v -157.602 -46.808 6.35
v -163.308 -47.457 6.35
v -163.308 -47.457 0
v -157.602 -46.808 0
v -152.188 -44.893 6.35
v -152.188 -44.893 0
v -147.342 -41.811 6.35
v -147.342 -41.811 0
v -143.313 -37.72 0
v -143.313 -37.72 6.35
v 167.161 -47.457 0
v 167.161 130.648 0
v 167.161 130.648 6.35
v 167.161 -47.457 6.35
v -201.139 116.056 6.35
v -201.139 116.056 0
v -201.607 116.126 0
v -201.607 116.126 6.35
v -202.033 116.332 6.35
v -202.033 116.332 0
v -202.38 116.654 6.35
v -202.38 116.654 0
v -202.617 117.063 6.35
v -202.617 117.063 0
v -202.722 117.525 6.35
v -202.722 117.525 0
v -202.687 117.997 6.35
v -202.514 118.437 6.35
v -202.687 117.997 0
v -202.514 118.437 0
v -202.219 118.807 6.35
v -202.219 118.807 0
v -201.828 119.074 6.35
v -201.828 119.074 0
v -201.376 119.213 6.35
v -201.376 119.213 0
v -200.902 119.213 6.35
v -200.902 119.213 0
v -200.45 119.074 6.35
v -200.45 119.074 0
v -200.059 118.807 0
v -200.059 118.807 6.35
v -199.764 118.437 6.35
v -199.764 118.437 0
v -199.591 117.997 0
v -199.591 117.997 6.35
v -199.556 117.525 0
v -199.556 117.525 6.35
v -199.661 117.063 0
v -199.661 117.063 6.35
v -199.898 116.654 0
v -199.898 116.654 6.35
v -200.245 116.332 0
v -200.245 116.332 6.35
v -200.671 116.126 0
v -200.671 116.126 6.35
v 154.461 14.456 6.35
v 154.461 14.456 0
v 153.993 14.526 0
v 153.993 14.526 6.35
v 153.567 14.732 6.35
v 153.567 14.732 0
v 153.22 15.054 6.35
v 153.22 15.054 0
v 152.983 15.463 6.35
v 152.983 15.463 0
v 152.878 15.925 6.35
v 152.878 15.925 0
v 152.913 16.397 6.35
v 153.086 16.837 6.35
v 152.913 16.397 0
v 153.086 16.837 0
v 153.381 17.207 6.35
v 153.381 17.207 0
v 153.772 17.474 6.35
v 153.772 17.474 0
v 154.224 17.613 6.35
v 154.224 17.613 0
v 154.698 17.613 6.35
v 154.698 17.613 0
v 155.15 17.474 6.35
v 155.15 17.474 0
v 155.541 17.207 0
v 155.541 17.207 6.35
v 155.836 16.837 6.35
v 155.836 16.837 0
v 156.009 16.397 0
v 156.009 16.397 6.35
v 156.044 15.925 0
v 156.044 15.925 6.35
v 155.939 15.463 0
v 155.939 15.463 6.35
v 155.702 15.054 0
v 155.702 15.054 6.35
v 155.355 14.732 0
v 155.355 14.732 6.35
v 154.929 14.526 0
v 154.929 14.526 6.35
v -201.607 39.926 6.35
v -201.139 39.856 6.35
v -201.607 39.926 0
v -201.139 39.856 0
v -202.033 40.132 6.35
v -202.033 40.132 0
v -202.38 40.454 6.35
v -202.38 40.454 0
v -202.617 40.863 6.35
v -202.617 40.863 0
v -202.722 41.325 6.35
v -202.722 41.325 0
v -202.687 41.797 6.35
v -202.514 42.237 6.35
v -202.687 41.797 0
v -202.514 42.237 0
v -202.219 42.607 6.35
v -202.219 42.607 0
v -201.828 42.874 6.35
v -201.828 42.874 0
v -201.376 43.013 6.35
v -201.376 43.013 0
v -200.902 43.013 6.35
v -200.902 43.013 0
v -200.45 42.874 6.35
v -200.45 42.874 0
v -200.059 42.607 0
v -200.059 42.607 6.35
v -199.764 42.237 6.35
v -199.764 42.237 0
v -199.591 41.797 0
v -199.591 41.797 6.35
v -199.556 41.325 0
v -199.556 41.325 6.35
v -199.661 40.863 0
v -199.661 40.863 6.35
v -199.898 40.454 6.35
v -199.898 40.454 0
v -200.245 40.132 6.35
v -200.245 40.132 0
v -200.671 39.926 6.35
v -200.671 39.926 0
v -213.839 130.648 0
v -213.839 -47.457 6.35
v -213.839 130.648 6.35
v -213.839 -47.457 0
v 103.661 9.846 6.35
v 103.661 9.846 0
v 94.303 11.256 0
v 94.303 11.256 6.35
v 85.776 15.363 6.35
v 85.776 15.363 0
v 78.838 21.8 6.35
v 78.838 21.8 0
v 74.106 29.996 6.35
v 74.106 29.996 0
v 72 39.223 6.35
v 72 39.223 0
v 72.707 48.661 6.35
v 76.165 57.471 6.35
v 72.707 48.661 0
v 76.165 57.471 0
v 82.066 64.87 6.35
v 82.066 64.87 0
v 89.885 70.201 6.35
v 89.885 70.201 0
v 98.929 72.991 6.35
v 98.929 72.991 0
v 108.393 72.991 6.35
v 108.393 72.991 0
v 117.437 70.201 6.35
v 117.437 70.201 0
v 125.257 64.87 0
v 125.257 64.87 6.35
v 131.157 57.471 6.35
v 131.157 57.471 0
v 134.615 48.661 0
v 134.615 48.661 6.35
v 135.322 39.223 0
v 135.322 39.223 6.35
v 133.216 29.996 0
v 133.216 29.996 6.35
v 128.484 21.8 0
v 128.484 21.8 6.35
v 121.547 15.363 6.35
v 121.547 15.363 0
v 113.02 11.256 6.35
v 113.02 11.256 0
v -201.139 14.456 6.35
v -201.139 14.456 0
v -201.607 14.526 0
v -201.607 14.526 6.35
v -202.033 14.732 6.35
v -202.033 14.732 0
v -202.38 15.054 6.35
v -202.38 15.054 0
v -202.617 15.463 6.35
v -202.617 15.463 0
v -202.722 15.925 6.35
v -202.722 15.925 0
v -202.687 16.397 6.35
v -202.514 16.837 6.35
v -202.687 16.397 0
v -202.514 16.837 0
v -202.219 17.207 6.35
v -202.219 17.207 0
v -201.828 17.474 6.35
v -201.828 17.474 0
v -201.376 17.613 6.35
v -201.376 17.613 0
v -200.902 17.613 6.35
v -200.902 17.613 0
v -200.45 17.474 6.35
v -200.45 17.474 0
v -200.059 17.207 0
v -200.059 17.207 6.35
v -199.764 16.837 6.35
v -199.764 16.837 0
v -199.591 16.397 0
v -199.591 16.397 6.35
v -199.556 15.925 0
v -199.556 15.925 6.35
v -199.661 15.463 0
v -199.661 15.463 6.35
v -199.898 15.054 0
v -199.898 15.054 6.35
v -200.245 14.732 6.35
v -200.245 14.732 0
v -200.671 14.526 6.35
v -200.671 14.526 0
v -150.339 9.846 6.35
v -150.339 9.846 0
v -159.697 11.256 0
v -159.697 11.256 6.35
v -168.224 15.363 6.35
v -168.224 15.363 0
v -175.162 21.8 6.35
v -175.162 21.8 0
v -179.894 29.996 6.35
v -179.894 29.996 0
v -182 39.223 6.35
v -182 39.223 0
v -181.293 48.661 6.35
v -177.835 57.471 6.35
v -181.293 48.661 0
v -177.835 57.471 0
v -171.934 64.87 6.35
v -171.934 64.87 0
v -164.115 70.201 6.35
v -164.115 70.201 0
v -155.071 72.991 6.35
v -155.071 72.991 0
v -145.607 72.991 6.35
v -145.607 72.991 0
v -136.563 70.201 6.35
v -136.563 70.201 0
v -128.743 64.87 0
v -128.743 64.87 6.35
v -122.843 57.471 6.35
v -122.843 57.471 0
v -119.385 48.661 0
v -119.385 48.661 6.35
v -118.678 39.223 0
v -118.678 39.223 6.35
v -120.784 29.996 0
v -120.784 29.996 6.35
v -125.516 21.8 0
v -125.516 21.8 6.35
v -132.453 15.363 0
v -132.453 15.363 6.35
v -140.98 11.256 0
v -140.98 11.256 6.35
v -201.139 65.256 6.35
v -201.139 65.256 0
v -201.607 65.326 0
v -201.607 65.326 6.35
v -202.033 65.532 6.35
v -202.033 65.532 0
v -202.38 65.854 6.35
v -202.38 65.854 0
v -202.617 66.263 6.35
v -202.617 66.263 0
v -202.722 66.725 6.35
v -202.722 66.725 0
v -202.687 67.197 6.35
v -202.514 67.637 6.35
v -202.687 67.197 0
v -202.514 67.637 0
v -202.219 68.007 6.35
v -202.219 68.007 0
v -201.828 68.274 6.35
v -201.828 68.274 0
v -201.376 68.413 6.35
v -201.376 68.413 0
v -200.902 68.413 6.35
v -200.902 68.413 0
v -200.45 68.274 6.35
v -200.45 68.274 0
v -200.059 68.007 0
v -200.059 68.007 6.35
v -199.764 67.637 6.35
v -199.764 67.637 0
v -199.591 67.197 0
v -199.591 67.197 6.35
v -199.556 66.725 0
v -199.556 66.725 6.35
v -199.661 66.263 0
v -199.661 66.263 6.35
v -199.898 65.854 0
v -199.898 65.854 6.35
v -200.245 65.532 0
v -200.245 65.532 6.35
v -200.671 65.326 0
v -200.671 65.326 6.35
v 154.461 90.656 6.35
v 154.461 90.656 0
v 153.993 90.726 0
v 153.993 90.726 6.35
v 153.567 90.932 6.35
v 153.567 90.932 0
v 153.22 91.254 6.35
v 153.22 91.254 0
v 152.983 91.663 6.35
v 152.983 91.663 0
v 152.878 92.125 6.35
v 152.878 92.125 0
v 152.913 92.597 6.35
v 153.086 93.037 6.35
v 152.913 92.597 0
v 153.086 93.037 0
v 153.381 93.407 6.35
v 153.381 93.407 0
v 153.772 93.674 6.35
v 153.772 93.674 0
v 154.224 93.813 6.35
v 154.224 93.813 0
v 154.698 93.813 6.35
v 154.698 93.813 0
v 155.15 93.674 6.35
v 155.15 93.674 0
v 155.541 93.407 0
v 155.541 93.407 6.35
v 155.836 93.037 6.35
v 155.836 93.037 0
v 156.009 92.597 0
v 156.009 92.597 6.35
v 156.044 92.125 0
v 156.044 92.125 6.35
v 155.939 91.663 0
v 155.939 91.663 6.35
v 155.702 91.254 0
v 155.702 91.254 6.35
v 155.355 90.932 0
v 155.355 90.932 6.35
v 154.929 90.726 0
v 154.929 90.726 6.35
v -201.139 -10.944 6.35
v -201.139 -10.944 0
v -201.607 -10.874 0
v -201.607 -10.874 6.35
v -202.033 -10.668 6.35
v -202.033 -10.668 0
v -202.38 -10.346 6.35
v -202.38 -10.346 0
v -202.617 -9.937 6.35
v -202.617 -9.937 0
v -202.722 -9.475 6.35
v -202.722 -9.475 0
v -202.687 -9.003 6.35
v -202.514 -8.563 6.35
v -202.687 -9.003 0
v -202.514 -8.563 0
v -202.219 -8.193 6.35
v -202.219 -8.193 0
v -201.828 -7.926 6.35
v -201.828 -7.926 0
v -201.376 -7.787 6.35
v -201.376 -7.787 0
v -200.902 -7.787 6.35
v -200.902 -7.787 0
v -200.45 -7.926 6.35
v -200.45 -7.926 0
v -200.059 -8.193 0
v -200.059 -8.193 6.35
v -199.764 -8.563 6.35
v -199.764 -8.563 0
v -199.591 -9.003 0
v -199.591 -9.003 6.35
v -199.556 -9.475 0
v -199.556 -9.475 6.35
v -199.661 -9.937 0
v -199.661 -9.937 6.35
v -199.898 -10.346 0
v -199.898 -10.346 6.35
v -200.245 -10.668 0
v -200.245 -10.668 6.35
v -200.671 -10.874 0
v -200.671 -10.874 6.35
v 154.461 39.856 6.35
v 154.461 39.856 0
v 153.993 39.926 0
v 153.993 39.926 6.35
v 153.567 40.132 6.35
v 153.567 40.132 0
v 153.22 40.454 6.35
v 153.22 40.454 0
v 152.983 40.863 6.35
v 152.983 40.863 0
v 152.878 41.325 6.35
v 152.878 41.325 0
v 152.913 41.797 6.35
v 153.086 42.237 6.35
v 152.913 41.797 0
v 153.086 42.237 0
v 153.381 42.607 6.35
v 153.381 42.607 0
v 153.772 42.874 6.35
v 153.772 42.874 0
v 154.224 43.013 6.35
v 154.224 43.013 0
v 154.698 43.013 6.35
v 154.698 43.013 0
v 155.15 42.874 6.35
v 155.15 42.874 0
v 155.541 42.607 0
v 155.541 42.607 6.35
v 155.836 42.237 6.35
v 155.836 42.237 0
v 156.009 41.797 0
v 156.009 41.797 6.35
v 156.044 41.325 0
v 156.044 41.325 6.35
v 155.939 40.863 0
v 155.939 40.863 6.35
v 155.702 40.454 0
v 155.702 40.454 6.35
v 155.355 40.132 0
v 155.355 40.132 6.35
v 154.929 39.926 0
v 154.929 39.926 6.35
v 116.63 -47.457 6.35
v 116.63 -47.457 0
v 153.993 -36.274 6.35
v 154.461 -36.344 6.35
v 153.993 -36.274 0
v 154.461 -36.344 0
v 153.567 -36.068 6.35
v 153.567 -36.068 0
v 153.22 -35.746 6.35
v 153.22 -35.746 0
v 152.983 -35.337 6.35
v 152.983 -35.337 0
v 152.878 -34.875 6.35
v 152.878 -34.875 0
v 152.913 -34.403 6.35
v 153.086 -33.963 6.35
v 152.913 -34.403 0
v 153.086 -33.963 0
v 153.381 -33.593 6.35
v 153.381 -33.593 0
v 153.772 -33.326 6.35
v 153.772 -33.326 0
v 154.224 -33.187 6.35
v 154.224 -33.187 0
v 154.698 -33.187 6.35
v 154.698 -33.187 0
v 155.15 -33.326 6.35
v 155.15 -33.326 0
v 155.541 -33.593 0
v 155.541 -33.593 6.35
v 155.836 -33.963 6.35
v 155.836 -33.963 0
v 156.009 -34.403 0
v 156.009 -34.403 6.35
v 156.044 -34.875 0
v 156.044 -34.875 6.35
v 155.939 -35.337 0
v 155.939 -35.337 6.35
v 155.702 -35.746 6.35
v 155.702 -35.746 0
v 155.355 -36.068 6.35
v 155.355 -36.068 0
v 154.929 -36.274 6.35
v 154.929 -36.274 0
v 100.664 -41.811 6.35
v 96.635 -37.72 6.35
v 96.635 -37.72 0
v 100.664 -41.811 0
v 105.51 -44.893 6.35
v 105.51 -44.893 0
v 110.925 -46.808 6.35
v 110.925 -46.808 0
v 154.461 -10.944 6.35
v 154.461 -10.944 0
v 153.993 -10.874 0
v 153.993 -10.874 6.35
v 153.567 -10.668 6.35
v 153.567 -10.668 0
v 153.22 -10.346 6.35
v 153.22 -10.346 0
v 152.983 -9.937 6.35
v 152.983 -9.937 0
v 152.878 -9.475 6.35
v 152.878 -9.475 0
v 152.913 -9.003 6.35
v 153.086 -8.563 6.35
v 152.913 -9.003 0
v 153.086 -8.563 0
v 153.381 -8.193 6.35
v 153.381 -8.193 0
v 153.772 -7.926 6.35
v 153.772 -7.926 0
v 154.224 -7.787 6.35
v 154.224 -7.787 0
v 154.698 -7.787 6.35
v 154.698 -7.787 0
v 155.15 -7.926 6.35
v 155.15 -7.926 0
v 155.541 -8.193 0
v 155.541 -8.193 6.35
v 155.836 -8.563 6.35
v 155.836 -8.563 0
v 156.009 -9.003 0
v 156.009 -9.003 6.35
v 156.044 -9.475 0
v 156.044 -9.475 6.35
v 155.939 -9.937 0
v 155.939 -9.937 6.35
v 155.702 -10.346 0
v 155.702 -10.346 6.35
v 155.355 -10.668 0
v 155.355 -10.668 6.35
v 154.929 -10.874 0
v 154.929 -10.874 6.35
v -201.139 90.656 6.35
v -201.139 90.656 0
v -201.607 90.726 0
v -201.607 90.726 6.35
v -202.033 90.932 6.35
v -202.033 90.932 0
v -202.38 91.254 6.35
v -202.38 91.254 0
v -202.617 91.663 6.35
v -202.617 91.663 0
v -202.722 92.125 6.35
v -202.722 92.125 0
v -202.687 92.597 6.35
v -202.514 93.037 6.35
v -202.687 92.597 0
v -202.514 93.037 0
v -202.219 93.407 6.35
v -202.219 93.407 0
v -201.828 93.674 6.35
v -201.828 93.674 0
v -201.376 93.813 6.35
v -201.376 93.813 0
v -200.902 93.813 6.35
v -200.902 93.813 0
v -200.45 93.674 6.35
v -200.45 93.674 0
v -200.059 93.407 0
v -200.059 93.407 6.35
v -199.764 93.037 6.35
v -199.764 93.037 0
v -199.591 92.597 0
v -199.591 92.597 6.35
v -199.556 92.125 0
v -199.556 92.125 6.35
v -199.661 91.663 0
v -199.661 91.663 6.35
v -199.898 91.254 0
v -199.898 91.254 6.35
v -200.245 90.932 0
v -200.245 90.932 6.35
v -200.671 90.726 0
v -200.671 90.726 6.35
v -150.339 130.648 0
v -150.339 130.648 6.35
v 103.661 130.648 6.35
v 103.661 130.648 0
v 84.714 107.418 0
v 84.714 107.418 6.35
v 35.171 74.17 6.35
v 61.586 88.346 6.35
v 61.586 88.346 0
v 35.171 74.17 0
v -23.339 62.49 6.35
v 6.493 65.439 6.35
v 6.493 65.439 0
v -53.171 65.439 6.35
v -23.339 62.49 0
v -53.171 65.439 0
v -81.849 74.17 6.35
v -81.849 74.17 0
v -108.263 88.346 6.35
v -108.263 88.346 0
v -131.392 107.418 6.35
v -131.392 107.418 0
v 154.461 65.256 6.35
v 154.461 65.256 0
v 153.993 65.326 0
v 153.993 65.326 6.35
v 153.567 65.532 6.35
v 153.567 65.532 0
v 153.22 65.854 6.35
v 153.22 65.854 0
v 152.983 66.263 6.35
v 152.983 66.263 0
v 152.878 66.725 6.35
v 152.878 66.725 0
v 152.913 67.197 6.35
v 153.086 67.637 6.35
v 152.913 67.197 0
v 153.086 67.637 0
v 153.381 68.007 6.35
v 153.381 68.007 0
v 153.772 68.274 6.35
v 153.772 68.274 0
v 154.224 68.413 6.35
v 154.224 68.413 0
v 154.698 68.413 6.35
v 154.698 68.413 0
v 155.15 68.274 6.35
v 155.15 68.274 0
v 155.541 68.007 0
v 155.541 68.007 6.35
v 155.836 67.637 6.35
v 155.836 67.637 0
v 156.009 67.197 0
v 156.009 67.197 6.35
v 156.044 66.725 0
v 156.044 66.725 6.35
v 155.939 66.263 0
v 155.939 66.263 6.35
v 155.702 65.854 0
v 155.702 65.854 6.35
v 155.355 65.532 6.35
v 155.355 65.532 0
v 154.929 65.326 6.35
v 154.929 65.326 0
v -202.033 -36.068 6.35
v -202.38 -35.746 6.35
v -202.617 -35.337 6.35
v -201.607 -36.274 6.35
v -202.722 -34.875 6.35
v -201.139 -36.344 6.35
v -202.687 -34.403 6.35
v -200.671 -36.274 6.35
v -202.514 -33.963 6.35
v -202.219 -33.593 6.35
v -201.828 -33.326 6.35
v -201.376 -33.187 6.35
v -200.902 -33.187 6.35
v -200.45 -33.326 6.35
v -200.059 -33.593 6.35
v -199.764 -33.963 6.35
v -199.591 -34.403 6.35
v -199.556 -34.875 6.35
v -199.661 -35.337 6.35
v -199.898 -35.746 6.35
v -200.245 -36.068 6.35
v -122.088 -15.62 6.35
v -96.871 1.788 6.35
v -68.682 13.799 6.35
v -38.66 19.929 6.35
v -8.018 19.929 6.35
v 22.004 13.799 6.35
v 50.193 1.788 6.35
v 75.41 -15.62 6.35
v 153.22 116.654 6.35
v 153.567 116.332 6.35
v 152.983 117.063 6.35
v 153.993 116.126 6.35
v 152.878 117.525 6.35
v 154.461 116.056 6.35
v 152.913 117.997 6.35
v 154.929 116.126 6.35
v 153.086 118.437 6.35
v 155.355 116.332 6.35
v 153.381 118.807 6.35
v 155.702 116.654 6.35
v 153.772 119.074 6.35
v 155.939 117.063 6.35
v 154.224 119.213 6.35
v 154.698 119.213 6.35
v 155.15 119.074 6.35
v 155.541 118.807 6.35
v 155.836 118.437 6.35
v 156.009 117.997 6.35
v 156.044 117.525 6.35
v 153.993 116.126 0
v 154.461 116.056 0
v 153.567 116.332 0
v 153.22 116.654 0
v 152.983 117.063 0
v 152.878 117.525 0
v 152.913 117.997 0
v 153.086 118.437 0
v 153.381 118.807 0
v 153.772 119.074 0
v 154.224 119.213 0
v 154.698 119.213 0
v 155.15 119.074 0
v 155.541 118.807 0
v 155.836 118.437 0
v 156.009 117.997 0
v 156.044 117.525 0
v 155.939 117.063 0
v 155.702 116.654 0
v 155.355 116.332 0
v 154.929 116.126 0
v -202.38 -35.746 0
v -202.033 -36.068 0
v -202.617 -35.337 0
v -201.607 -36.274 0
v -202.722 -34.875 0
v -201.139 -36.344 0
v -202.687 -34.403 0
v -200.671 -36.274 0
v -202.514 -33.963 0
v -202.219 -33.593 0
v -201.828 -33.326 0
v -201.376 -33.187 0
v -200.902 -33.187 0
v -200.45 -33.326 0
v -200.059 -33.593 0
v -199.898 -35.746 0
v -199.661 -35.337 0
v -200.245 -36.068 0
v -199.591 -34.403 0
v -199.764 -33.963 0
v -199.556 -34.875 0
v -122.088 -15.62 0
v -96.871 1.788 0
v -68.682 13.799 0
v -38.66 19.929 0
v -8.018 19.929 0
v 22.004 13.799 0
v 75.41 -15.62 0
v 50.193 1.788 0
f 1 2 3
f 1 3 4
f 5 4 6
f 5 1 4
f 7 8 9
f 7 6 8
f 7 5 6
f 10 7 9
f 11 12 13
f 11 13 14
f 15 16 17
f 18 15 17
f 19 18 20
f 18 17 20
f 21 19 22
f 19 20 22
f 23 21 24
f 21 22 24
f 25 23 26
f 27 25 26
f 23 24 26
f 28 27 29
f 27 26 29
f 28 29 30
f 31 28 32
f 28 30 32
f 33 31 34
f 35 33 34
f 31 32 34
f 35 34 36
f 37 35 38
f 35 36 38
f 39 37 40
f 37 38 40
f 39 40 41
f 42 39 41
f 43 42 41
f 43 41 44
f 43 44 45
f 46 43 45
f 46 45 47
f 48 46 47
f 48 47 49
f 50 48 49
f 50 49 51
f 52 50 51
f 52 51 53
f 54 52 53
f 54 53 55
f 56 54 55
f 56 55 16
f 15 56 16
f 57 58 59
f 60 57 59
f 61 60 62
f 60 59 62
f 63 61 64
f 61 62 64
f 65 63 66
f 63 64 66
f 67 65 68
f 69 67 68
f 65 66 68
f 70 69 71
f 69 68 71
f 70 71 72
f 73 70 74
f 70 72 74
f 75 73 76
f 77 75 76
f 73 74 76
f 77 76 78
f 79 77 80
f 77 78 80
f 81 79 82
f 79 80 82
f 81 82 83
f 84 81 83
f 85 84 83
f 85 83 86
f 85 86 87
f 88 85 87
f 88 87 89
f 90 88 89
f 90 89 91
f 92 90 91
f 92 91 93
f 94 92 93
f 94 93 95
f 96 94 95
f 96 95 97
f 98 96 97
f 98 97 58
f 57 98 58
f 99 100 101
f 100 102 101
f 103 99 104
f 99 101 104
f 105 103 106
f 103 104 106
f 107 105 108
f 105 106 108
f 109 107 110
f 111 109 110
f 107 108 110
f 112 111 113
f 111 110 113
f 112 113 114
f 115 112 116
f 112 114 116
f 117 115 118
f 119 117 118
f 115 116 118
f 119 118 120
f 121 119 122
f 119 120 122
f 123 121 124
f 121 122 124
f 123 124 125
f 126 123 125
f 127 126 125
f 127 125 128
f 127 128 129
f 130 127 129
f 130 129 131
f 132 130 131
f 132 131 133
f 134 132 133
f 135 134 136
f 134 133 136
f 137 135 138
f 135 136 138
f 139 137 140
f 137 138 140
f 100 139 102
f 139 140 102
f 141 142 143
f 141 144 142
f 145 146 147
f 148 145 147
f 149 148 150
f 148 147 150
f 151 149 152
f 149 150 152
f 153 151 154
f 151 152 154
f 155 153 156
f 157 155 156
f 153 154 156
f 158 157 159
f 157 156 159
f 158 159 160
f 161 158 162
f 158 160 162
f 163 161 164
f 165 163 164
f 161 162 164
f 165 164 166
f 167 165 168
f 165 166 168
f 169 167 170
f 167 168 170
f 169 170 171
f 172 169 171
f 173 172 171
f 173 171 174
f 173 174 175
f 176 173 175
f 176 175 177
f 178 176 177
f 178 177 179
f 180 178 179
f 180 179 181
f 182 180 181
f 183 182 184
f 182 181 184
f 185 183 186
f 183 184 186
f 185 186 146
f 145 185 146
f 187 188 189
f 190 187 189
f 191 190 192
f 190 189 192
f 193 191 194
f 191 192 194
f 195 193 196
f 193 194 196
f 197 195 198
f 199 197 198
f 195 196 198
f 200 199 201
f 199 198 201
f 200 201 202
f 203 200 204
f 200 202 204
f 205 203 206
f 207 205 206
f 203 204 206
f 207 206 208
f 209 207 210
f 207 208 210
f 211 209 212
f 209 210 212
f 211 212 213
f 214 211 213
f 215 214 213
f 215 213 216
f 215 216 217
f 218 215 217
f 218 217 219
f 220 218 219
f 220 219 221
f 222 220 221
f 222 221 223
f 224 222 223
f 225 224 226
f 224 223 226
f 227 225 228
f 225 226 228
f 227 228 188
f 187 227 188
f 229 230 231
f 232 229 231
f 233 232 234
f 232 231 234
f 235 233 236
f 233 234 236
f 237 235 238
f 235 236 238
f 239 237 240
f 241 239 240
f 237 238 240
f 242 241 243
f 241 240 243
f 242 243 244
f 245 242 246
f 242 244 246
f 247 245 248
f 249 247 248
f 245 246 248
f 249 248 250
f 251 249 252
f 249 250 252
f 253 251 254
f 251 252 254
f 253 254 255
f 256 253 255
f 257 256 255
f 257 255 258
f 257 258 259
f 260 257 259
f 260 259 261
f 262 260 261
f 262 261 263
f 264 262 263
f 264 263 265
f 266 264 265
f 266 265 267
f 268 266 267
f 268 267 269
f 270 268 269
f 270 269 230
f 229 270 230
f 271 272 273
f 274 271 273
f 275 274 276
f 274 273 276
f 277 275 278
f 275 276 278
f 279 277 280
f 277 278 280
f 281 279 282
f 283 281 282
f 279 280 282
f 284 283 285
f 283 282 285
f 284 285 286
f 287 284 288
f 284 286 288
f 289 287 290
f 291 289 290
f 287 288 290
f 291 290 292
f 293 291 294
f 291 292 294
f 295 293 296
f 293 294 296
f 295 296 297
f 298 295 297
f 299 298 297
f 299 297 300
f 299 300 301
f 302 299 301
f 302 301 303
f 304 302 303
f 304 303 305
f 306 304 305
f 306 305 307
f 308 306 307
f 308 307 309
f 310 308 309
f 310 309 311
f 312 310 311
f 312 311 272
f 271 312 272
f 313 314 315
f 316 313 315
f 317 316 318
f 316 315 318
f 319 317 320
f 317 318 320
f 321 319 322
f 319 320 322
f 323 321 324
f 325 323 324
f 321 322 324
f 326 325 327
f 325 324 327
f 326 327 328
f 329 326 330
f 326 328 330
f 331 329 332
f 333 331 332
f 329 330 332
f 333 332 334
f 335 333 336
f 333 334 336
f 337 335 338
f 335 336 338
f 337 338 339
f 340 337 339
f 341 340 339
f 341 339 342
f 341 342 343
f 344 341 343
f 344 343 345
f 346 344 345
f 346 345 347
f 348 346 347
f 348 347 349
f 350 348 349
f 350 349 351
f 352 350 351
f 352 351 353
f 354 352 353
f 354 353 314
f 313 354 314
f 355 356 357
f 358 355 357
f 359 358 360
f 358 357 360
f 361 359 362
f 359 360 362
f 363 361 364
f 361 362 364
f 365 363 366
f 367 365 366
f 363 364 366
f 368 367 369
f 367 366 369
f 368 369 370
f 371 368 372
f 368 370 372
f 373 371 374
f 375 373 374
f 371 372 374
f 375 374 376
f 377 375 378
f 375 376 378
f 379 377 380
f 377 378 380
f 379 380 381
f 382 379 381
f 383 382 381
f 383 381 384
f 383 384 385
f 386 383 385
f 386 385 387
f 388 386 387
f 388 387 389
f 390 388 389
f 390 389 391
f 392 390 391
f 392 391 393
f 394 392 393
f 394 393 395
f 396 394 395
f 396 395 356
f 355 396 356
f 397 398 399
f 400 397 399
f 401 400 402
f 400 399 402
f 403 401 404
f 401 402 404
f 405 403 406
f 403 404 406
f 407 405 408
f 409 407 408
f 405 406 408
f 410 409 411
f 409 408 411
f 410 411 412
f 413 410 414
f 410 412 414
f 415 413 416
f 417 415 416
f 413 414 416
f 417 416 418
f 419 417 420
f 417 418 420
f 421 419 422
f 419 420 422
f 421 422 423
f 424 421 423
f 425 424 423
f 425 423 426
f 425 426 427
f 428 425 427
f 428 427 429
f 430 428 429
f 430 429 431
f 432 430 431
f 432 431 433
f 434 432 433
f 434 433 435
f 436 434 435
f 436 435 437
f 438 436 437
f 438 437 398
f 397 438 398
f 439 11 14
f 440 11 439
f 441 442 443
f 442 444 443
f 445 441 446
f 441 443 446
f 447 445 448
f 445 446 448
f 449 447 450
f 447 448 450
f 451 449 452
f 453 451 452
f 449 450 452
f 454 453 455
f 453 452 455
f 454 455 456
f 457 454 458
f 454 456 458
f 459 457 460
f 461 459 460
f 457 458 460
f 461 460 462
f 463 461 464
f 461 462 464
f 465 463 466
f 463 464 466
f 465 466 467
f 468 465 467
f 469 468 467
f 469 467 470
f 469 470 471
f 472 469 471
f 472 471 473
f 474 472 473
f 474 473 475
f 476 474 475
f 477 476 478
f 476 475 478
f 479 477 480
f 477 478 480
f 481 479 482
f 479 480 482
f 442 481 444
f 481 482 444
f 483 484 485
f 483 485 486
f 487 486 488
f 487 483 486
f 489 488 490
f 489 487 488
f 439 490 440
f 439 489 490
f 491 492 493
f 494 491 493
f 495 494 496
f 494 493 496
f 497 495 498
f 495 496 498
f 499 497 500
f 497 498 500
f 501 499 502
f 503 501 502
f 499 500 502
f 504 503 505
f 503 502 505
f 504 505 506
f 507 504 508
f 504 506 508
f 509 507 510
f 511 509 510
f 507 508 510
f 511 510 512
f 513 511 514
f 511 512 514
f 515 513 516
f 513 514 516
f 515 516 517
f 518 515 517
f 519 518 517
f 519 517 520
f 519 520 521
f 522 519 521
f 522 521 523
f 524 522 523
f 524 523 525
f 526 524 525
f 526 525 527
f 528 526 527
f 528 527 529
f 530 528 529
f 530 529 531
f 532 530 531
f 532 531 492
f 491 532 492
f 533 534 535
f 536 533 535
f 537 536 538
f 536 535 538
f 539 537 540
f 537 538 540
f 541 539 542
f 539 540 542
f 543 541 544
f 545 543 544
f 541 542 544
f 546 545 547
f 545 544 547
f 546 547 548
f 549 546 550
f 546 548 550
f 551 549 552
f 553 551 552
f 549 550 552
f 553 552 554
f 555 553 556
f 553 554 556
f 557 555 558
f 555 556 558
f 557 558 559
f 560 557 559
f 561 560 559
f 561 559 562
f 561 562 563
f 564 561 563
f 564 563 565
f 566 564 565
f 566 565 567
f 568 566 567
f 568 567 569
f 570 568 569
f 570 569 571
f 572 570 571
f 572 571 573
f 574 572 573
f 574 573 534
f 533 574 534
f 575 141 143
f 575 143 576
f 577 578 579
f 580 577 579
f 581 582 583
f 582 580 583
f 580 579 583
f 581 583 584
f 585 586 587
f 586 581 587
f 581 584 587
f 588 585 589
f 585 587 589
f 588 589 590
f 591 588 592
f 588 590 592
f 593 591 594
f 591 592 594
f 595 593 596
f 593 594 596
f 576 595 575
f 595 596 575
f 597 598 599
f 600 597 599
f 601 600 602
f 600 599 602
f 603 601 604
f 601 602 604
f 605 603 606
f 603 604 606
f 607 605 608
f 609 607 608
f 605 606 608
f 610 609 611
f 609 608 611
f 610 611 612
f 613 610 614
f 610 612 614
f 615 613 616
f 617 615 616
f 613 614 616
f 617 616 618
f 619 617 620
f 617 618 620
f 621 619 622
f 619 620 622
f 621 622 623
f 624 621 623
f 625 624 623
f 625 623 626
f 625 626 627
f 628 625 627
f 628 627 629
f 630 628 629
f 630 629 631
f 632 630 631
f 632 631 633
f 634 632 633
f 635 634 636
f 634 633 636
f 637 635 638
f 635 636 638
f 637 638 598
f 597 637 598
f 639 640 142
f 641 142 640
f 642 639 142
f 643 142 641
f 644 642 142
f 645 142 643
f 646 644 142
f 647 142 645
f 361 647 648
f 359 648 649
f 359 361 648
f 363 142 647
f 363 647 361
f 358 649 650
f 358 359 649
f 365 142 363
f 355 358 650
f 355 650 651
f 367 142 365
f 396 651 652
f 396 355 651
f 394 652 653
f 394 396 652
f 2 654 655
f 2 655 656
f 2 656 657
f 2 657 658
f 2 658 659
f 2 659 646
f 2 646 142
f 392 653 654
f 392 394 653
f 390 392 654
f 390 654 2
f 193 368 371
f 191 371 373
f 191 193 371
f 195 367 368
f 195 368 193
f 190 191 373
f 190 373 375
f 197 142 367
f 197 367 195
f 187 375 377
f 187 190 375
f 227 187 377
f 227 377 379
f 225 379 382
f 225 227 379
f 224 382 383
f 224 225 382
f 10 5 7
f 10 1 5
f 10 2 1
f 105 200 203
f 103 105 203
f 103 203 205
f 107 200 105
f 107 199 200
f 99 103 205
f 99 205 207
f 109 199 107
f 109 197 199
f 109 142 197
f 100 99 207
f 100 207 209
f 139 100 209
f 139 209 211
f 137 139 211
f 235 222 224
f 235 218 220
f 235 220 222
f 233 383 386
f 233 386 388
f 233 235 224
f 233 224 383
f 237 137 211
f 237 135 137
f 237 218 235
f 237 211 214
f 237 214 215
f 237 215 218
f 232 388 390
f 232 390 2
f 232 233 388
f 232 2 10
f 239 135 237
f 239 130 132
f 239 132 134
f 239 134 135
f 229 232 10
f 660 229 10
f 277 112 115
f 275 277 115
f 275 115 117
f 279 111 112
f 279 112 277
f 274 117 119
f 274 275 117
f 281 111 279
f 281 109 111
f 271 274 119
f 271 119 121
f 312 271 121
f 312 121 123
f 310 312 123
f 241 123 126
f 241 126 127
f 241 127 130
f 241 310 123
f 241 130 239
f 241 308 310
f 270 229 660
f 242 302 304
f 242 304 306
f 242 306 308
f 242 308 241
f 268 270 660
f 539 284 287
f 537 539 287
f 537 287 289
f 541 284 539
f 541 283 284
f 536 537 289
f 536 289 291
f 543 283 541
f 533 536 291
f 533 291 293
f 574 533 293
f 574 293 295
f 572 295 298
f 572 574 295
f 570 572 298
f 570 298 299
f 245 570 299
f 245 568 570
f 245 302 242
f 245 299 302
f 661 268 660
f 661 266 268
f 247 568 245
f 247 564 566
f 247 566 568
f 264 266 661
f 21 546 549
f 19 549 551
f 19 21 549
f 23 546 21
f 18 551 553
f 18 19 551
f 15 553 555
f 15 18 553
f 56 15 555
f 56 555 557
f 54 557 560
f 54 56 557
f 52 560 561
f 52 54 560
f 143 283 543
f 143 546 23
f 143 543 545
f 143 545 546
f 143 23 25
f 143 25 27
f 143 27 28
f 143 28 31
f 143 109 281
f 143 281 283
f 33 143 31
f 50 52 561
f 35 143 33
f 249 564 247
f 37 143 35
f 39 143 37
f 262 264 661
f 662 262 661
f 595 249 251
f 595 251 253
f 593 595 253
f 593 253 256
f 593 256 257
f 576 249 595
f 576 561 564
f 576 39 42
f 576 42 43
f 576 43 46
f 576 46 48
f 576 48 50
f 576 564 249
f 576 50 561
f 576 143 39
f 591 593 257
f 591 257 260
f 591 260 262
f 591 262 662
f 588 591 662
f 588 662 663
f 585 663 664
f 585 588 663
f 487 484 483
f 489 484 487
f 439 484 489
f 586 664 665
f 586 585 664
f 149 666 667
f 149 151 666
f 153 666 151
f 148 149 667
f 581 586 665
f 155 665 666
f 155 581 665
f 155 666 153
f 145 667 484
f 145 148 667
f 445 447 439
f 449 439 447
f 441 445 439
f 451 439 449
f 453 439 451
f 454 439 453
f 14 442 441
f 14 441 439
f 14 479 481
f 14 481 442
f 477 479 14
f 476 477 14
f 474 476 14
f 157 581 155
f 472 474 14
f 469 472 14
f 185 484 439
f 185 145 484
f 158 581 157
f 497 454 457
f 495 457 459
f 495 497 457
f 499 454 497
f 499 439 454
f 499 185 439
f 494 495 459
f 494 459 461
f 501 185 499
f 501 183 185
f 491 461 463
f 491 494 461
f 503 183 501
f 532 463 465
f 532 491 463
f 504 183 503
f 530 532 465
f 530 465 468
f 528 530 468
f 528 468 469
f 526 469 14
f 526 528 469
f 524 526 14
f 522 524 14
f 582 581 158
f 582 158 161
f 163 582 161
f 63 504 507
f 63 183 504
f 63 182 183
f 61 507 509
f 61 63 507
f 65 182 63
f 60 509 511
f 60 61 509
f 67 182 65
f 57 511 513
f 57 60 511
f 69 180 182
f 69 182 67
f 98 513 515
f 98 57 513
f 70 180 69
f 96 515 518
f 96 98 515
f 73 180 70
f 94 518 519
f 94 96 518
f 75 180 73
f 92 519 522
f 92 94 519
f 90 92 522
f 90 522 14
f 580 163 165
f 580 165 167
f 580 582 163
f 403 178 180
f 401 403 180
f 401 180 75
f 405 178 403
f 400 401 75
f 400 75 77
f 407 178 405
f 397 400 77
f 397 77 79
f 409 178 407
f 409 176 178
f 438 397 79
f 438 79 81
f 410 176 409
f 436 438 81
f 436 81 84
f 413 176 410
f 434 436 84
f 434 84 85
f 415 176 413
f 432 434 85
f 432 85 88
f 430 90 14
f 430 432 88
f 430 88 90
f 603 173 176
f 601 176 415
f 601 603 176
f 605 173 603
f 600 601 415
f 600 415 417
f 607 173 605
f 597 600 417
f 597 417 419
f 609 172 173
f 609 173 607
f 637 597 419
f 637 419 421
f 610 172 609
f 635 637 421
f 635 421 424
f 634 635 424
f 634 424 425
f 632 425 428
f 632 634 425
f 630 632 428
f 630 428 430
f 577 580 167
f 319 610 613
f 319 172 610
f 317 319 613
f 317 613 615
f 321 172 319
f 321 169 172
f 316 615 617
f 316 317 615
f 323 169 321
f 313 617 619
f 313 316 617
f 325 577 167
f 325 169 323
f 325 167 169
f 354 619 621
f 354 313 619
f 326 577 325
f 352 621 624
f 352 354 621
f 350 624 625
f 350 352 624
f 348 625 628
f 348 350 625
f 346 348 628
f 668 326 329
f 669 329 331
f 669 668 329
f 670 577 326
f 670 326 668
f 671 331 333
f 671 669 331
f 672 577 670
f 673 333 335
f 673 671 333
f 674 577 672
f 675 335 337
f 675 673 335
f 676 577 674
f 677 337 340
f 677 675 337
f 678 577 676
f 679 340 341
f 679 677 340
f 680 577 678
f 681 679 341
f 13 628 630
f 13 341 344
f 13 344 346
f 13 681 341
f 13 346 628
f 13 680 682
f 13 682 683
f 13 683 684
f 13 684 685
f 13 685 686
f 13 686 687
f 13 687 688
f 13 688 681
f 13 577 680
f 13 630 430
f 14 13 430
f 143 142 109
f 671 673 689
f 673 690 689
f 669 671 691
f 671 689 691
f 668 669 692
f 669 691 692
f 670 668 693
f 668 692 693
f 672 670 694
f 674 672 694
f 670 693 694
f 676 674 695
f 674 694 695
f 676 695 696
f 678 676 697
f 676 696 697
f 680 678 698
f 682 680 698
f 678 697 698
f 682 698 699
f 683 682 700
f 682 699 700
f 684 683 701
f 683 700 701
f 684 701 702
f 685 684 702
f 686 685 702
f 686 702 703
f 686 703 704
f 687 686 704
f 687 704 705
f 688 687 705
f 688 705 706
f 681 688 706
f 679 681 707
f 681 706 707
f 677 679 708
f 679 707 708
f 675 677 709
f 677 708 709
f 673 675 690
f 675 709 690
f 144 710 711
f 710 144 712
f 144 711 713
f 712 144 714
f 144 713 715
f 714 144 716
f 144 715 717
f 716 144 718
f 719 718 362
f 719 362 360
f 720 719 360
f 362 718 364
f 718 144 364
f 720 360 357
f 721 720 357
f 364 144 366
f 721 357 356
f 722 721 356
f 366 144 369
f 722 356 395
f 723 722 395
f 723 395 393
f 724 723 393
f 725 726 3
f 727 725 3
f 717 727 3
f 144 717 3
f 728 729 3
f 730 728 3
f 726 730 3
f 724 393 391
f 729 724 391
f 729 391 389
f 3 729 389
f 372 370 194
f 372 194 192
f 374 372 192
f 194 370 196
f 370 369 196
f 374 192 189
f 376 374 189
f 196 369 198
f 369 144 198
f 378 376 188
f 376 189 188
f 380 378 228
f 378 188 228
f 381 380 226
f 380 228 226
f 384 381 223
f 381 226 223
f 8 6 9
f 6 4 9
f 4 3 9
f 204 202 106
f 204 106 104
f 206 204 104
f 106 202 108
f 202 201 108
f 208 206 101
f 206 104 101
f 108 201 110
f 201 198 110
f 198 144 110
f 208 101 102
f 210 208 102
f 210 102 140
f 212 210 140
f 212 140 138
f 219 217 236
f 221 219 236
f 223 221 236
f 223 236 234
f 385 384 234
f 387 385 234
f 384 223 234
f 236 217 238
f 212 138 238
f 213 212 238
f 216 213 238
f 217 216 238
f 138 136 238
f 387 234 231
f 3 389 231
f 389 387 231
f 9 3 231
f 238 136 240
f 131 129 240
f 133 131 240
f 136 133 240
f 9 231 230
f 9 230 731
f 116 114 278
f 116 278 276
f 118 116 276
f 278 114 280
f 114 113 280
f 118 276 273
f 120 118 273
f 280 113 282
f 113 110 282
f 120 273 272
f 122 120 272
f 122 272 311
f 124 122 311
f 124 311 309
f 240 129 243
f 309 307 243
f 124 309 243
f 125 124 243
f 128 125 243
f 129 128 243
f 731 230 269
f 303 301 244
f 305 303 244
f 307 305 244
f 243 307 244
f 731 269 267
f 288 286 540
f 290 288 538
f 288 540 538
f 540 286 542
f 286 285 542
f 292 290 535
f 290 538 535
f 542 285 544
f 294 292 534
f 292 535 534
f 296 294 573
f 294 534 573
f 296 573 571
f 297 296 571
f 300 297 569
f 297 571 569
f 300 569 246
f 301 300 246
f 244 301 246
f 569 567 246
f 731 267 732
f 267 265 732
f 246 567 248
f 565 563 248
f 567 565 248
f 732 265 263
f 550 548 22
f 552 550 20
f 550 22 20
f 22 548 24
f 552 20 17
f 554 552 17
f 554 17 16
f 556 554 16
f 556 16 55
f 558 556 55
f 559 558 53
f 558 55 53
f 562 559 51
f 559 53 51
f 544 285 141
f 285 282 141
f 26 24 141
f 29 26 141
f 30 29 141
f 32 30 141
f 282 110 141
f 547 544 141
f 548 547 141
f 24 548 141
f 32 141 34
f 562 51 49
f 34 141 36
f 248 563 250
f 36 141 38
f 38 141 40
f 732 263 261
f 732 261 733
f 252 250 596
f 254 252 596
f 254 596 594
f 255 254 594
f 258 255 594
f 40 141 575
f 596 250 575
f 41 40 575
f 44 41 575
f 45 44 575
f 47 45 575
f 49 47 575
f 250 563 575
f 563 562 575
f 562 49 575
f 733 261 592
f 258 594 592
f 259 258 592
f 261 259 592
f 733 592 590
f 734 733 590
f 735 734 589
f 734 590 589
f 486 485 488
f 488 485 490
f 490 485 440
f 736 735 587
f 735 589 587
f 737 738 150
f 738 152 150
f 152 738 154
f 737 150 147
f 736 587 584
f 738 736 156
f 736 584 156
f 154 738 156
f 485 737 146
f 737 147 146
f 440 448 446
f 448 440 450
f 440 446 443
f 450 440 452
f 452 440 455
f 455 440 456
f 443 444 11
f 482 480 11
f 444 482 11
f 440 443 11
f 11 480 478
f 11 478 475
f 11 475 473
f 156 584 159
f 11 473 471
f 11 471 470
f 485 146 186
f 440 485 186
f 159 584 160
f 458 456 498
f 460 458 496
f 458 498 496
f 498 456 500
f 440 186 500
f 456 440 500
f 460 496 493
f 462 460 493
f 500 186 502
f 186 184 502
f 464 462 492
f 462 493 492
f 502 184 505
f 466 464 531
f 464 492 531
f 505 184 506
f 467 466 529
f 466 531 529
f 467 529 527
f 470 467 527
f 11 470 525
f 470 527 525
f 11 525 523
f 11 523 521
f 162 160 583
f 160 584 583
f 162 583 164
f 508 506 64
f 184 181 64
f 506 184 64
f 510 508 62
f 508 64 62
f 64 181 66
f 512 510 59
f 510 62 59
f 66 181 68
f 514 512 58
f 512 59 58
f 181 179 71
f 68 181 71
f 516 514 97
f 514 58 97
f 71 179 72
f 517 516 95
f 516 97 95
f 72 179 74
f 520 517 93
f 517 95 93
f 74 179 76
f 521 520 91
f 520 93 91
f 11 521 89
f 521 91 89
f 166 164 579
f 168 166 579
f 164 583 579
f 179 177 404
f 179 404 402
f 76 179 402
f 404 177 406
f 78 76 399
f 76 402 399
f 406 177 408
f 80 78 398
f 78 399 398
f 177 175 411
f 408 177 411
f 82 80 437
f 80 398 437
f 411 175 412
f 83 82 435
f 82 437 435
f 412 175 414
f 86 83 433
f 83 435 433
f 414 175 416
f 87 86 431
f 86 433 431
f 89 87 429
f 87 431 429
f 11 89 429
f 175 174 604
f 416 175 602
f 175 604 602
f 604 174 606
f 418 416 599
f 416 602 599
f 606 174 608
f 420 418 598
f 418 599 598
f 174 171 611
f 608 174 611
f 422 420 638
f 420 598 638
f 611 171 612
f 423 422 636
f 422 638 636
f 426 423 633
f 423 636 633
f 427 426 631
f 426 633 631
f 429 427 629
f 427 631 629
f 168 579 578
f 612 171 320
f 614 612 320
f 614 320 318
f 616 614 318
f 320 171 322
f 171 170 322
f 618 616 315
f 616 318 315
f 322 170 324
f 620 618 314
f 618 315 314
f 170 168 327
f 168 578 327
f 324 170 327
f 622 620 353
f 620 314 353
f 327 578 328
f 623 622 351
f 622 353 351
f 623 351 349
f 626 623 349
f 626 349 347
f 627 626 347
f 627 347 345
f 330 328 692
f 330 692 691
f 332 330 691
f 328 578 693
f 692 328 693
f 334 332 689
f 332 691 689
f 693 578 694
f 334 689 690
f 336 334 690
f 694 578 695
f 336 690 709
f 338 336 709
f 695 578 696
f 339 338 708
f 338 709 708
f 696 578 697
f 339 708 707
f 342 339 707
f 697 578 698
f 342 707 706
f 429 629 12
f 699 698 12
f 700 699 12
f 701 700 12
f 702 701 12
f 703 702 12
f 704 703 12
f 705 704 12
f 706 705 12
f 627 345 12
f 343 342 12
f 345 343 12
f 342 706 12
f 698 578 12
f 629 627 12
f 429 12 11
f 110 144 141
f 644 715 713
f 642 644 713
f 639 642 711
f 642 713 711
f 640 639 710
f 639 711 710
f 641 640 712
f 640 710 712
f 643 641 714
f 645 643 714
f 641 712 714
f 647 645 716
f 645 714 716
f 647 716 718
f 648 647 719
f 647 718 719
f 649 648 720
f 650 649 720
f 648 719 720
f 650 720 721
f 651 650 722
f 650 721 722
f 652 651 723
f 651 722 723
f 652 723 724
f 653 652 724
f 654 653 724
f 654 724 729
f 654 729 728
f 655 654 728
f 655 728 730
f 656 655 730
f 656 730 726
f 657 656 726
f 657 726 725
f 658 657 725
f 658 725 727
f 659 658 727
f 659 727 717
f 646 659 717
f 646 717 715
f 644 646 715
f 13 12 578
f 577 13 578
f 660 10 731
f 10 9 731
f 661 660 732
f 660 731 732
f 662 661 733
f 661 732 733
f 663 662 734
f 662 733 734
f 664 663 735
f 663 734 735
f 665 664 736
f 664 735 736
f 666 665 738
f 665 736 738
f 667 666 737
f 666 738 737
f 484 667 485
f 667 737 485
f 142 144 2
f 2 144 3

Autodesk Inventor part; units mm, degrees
ref_plane "YZ Plane" through (0, 0, 0) normal (1, 0, 0) x (0, 1, 0)
ref_plane "XZ Plane" through (0, 0, 0) normal (0, 1, 0) x (-1, 0, 0)
ref_plane "XY Plane" through (0, 0, 0) normal (0, 0, 1) x (1, 0, 0)
sketch "Sketch1" plane through (0, 0, 0) normal (0, 0, 1) x (1, 0, 0)
  line L0 (167.1611, 130.6481) -> (167.1611, -47.4567)
  line L1 (-213.8389, -47.4567) -> (-213.8389, 130.6481)
  line L2 (-213.8389, -47.4567) -> (-150.3389, -47.4567)
  line L3 (167.1611, -47.4567) -> (103.6611, -47.4567)
  arc A0 (103.6611, -47.4567) -> (-150.3389, -47.4567) centre (-23.3389, -131.699) ccw
  line L4 (-213.8389, 130.6481) -> (-150.3389, 130.6481)
  line L5 (167.1611, 130.6481) -> (103.6611, 130.6481)
  arc A1 (-150.3389, 130.6481) -> (103.6611, 130.6481) centre (-23.3389, 214.8904) ccw
  point P0 (0, 0)
  dimension "d0" = 381
  dimension "d1" = 178.1048
  dimension "d35" = 63.5
  dimension "d36" = 63.5
  dimension "d39" = 152.4
  dimension "d40" = 63.5
  dimension "d41" = 63.5
  dimension "d42" = 152.4
extrude "Extrusion1" add sketch "Sketch1" along normal blind 6.35
fillet "Fillet1" radius 25.4 2 edges at (-150.3389, -47.4567, 3.175) (103.6611, -47.4567, 3.175)
hole "Hole1" at (-150.3389, 41.5957, 6.35) direction (0, 0, -1) diameter 63.5 end through all
hole "Hole2" at (103.6611, 41.5957, 6.35) direction (0, 0, -1) diameter 63.5 end through all
hole "Hole3" at (-201.1389, -34.7567, 6.35) direction (0, 0, -1) diameter 3.175 end through all
hole "Hole4" at (154.4611, -34.7567, 6.35) direction (0, 0, -1) diameter 3.175 end through all
pattern_linear "Rectangular Pattern4" count 7 spacing 25.4 along (0, 1, 0) of "Hole3"
pattern_linear "Rectangular Pattern5" count 7 spacing 25.4 along (0, 1, 0) of "Hole4"
properties part number "Devant - Haut Rammasse-Balle"
